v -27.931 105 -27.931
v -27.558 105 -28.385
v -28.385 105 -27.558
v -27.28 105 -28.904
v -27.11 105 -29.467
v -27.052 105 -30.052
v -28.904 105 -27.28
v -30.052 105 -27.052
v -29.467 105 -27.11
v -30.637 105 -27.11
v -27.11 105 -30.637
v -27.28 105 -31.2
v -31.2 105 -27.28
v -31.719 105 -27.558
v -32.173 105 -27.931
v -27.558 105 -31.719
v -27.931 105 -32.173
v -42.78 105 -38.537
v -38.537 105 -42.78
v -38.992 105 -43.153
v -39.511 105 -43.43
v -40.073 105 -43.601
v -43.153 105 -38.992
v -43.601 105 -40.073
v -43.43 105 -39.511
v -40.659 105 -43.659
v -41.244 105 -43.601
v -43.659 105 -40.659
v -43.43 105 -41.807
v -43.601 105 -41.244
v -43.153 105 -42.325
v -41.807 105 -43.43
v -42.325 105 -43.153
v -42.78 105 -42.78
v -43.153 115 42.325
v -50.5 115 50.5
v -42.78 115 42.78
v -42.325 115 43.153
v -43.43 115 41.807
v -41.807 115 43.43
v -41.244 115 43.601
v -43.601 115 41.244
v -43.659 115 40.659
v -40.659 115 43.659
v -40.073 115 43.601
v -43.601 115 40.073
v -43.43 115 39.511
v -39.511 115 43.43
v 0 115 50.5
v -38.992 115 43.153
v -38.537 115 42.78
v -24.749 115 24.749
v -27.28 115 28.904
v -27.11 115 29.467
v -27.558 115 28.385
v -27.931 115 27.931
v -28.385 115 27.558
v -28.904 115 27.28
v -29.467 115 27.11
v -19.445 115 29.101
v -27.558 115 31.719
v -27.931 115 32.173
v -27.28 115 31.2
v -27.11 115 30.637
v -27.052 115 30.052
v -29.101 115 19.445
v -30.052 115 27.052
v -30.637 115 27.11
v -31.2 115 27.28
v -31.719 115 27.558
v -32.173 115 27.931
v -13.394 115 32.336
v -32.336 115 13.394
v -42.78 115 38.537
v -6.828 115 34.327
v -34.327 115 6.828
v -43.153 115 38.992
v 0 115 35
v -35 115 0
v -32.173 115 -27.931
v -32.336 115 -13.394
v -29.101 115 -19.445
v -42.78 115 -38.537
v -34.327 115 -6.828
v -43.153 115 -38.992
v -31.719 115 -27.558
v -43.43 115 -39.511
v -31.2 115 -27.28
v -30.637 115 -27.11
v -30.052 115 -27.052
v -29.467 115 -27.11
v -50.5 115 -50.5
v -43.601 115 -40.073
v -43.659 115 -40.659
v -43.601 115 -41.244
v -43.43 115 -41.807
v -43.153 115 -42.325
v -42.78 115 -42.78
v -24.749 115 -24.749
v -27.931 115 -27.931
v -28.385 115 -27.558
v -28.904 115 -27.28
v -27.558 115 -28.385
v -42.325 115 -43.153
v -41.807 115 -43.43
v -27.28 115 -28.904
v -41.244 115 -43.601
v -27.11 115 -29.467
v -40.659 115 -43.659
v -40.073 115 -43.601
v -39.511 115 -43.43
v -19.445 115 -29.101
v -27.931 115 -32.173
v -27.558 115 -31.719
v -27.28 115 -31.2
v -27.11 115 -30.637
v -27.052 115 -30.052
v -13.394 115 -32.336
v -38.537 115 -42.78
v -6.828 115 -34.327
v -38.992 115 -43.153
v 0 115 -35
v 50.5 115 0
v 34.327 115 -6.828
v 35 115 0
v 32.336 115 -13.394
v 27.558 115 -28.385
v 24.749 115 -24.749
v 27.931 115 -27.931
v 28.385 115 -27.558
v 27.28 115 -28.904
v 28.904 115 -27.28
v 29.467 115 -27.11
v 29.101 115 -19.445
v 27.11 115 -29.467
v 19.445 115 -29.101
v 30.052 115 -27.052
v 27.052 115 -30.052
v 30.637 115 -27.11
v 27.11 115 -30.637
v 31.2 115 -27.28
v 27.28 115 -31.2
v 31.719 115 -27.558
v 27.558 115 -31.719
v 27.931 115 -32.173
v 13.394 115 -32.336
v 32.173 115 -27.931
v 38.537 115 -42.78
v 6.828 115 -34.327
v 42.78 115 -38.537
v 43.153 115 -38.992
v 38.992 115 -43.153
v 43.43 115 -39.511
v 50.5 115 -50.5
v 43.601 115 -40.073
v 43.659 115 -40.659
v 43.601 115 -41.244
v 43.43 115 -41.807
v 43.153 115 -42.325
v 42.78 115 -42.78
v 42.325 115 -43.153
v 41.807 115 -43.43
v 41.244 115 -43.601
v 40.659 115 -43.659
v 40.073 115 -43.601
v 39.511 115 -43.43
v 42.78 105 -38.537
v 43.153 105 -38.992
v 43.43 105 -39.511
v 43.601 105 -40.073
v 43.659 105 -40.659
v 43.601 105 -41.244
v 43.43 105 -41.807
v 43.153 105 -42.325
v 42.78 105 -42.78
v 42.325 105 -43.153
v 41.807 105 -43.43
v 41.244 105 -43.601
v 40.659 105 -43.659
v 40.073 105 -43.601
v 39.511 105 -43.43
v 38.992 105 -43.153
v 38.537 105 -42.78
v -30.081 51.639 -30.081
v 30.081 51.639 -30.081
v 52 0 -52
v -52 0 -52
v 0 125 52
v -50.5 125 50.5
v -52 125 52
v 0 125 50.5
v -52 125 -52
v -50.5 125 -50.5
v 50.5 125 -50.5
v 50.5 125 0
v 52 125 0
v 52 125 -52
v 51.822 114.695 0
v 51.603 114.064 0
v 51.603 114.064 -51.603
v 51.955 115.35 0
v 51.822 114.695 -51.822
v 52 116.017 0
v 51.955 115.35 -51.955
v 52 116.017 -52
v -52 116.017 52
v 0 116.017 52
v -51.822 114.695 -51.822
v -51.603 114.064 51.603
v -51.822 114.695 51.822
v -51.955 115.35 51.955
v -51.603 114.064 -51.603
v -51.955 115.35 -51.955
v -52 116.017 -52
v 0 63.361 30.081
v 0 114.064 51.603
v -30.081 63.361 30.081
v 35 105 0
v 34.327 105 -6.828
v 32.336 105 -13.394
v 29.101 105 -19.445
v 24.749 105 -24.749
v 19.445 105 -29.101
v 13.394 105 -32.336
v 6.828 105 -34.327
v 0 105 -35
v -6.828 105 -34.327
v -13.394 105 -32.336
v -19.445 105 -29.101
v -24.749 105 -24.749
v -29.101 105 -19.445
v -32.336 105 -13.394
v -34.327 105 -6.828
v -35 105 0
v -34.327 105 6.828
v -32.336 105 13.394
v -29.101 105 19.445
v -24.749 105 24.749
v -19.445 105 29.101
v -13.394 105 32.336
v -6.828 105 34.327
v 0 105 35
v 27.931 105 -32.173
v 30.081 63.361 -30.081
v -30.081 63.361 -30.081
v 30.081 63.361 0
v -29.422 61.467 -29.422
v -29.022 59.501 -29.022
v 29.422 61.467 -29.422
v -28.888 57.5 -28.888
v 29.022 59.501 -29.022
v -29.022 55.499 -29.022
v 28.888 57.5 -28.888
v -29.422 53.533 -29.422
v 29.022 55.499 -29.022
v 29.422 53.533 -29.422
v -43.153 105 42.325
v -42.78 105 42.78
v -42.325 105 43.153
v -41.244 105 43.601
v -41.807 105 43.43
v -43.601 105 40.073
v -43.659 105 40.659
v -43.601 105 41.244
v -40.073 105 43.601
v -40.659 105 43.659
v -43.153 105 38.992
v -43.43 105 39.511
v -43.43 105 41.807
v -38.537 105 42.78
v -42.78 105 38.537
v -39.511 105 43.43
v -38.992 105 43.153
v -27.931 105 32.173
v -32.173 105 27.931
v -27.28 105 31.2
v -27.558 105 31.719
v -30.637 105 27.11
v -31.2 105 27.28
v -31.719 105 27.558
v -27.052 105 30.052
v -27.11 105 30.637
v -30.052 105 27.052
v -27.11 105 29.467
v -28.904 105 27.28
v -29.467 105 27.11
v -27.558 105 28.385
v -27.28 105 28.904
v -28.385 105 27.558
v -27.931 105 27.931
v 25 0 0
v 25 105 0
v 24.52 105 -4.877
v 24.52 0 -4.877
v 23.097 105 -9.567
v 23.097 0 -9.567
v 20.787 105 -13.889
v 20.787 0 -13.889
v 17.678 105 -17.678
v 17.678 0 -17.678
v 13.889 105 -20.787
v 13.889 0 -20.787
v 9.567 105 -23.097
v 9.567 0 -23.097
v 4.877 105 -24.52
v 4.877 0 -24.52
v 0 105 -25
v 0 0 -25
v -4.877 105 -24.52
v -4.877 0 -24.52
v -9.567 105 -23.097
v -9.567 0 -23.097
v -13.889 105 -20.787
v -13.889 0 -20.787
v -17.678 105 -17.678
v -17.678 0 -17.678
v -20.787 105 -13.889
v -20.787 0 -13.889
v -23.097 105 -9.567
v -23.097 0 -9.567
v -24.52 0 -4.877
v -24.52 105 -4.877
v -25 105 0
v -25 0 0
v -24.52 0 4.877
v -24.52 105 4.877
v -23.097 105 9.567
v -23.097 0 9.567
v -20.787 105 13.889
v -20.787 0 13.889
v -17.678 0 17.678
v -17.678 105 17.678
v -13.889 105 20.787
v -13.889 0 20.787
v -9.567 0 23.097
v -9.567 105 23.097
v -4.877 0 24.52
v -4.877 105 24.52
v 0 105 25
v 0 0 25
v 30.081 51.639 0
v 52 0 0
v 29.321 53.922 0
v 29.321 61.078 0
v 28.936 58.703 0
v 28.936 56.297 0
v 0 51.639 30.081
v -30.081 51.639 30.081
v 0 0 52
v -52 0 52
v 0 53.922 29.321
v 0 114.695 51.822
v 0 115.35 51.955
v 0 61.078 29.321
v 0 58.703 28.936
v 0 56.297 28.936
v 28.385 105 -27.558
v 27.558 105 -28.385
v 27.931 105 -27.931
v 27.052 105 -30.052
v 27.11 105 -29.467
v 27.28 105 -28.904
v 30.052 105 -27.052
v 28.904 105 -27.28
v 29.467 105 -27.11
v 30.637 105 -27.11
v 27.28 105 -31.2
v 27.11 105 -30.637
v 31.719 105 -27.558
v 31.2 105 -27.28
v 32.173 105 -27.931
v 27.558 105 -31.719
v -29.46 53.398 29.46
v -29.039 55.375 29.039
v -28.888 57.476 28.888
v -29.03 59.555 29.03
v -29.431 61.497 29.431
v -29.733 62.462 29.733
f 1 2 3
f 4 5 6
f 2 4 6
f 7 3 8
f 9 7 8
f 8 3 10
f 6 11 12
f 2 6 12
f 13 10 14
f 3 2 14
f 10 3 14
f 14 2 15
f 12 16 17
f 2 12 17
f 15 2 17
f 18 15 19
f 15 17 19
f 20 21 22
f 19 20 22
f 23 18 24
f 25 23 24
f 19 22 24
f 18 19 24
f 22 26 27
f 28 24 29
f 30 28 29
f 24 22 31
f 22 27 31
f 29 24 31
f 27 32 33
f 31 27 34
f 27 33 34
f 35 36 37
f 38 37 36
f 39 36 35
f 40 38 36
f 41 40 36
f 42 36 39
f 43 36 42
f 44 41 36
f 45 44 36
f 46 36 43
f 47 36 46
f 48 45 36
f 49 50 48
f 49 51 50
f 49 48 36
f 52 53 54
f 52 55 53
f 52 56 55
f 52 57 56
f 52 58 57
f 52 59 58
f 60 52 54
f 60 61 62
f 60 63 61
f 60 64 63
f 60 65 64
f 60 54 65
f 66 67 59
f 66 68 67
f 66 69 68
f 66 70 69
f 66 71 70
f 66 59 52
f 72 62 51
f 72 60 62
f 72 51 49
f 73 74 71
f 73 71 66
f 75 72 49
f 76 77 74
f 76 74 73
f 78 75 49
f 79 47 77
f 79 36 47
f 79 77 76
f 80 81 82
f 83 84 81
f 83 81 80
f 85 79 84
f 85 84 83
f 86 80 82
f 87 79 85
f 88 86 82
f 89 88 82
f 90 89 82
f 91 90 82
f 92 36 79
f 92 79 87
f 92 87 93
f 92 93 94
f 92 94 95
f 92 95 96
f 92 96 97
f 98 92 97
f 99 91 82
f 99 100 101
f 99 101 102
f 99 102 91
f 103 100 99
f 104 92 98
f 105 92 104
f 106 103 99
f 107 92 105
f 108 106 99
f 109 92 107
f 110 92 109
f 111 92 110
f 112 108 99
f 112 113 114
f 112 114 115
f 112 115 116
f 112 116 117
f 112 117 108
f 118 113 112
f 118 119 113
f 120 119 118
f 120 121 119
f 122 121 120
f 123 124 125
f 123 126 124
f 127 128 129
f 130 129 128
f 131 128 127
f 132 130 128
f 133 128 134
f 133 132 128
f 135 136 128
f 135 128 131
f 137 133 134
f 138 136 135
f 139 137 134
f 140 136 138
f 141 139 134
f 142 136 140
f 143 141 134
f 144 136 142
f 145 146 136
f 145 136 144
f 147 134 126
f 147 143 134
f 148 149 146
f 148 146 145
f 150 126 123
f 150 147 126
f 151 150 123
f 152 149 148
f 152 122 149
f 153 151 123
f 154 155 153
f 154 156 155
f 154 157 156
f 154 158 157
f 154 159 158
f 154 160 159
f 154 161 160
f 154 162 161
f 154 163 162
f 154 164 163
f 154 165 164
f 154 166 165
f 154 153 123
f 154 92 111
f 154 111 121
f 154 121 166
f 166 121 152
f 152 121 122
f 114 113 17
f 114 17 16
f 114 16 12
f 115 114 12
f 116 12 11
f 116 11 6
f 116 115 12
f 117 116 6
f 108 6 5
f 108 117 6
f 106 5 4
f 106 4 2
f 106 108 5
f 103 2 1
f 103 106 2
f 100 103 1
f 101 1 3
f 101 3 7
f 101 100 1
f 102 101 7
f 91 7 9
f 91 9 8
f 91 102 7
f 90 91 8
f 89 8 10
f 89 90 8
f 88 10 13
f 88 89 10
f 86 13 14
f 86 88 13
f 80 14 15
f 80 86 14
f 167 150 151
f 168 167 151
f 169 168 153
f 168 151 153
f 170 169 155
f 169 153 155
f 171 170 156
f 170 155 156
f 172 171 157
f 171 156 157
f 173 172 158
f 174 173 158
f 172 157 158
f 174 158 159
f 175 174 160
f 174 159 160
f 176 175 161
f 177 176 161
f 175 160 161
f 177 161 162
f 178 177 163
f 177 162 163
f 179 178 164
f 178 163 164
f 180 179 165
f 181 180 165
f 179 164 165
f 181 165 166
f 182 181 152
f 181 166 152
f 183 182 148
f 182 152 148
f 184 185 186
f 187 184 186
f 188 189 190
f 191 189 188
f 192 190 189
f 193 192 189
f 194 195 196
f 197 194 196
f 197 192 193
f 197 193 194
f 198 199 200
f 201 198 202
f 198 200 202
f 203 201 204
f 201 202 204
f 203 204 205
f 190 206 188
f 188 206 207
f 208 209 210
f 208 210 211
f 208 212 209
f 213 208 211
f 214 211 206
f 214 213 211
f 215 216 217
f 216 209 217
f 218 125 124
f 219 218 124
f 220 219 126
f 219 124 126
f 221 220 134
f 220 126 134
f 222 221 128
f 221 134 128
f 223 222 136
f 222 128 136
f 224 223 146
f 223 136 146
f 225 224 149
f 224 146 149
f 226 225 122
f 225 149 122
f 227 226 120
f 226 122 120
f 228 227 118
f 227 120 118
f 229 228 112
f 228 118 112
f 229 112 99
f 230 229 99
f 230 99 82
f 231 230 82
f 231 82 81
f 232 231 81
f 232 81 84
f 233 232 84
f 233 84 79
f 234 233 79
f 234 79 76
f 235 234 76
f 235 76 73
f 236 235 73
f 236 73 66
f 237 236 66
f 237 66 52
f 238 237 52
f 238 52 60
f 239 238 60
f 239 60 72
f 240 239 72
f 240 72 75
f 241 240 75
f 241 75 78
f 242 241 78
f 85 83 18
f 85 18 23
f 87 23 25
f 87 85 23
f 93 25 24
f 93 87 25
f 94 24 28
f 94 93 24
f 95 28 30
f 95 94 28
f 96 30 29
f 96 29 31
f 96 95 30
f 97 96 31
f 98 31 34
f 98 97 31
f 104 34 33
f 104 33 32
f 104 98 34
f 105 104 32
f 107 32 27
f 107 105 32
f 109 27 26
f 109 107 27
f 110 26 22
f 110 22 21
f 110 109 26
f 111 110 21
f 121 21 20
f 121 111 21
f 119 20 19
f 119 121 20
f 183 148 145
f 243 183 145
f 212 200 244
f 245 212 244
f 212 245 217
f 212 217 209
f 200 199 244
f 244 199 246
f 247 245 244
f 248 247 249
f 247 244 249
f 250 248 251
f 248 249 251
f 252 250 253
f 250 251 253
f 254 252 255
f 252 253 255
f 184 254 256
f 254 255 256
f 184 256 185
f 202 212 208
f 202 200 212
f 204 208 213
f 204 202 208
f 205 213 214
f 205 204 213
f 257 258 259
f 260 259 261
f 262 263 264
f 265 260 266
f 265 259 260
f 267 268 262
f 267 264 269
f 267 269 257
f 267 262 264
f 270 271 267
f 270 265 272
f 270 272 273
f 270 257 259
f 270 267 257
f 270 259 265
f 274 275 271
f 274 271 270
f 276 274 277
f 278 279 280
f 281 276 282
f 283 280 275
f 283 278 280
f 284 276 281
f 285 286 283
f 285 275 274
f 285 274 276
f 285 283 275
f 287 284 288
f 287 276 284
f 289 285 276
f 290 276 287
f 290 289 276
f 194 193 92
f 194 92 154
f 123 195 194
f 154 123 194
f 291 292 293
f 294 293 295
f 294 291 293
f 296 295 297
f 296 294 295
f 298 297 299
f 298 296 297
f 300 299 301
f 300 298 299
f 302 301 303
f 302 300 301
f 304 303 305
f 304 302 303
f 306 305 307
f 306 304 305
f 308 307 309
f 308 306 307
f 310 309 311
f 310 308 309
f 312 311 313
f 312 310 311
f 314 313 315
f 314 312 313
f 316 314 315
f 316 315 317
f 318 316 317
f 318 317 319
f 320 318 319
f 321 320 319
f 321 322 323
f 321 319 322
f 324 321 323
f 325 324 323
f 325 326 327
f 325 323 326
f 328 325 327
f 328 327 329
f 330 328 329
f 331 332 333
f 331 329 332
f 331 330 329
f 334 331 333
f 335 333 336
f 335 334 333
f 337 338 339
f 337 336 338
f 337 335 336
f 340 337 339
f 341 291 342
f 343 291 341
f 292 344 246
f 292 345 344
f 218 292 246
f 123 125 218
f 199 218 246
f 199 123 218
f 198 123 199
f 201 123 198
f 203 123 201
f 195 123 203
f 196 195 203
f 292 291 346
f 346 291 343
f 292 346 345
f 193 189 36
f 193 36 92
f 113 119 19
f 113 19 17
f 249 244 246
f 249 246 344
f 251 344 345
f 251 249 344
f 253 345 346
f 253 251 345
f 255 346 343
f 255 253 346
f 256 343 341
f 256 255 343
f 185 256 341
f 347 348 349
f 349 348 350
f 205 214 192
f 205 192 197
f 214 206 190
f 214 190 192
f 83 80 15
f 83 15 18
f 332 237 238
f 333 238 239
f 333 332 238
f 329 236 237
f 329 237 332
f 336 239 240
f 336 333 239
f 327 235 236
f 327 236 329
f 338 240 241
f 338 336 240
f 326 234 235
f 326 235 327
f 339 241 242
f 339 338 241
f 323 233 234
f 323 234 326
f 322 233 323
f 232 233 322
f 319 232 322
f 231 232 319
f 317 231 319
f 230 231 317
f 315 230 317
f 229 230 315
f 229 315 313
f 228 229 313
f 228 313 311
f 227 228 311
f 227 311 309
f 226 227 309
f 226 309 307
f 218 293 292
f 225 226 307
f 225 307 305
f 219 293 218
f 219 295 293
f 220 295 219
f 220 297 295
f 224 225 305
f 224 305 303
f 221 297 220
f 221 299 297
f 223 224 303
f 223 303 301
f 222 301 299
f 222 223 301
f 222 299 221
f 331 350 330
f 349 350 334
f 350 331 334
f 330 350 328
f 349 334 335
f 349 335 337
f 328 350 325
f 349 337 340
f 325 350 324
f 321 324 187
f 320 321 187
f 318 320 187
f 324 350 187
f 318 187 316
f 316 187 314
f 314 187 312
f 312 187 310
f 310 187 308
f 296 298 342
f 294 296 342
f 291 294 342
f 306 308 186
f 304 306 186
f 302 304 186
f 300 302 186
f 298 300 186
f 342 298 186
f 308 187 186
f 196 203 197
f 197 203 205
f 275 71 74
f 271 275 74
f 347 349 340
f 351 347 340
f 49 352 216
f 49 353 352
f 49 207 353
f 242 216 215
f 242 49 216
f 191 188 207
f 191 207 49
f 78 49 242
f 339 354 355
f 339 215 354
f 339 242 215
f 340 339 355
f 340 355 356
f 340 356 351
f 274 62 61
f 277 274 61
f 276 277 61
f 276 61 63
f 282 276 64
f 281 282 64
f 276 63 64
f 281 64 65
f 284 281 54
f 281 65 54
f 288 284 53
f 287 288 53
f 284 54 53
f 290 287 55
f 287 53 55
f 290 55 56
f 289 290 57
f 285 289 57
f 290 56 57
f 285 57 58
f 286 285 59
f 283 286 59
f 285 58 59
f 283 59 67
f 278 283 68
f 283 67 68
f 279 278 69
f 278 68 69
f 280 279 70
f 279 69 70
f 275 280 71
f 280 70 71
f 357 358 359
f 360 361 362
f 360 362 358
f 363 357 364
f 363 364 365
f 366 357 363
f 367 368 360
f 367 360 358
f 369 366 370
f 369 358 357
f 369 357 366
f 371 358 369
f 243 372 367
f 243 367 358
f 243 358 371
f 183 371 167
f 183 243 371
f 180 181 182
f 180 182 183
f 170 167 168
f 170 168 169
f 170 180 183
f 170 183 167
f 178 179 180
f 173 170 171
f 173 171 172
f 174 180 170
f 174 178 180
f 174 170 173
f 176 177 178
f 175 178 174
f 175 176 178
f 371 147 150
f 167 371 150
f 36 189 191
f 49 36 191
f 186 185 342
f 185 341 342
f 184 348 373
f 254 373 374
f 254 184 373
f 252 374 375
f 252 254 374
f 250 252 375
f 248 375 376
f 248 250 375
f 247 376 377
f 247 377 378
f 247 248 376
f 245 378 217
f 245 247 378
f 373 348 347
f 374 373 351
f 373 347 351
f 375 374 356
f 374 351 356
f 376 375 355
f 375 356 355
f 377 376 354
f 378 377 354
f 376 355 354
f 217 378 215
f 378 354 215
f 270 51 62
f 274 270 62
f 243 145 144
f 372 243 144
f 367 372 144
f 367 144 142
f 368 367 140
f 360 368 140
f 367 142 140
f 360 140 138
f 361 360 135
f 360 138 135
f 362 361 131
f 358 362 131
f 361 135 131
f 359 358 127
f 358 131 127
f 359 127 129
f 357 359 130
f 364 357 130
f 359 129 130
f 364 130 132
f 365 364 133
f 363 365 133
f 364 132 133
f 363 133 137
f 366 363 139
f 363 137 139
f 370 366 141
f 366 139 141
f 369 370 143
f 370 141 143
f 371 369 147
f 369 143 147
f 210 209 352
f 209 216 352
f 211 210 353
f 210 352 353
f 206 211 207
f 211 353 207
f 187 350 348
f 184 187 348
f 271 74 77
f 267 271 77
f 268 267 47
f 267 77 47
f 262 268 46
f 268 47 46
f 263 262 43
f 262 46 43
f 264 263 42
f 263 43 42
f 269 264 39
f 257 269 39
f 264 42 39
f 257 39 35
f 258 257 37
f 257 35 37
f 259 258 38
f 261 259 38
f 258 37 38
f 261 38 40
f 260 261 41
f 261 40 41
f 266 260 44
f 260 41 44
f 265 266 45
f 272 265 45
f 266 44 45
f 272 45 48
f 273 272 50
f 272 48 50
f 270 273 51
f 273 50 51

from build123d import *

# Parameters (mm, degrees)
SKETCH1_W               = 104
SKETCH1_H               = 104
BOSS_EXTRUDE1_DEPTH     = 125
CUT_EXTRUDE3_DEPTH      = 125
CUT_EXTRUDE4_DEPTH      = 146.027583583
CUT_EXTRUDE4_DEPTH_BACK = 146.027583583
CUT_EXTRUDE5_DEPTH      = 146.027583583
CUT_EXTRUDE5_DEPTH_BACK = 146.027583583
SKETCH4_R               = 25
SKETCH5_W               = 101
SKETCH5_H               = 101
CUT_EXTRUDE6_DEPTH      = 10
SKETCH6_W               = 52
SKETCH6_H               = 52
CUT_EXTRUDE7_DEPTH      = 125
SKETCH7_W               = 52
SKETCH7_H               = 52
CUT_EXTRUDE8_DEPTH      = 125
SKETCH8_R               = 35
CUT_EXTRUDE9_DEPTH      = 10
CUT_EXTRUDE10_DEPTH     = 10
FILLET3_R               = 5
FILLET4_R               = 15


with BuildPart() as part:
    # Sketch1 → Boss-Extrude1 (new body)
    with BuildSketch(Plane(origin=(0, 0, 0), x_dir=(1, 0, 0), z_dir=(0, 1, 0))):
        Rectangle(SKETCH1_W, SKETCH1_H)
    extrude(amount=BOSS_EXTRUDE1_DEPTH)

    # Sketch2 → Cut-Extrude3 (cut)
    with BuildSketch(Plane.XY.offset(52)):
        Polygon((-27.592698068, 57.5), (-52, 115), (-52, 0), align=None)
        Polygon((52, 0), (52, 115), (27.592698068, 57.5), align=None)
    extrude(amount=-CUT_EXTRUDE3_DEPTH, mode=Mode.SUBTRACT)

    # Sketch3 → Cut-Extrude4 (cut, two sides: drawn at the far end of the back side and taken through both)
    with BuildSketch(Plane(origin=(0, 0, 0), x_dir=(0, 0, -1), z_dir=(1, 0, 0)).offset(-CUT_EXTRUDE4_DEPTH_BACK)):
        Polygon((-52, 115), (-27.592698068, 57.5), (-52, 0), align=None)
        Polygon((52, 115), (27.592698068, 57.5), (52, 0), align=None)
    extrude(amount=CUT_EXTRUDE4_DEPTH + CUT_EXTRUDE4_DEPTH_BACK, mode=Mode.SUBTRACT)

    # Sketch4 → Cut-Extrude5 (cut, two sides: drawn at the far end of the back side and taken through both)
    with BuildSketch(Plane(origin=(0, 125, 0), x_dir=(1, 0, 0), z_dir=(0, 1, 0)).offset(-CUT_EXTRUDE5_DEPTH_BACK)):
        with Locations(Location((0, 0, 0), (0, 0, 270))):
            Circle(SKETCH4_R)
    extrude(amount=CUT_EXTRUDE5_DEPTH + CUT_EXTRUDE5_DEPTH_BACK, mode=Mode.SUBTRACT)

    # Sketch5 → Cut-Extrude6 (cut)
    with BuildSketch(Plane(origin=(0, 125, 0), x_dir=(1, 0, 0), z_dir=(0, 1, 0))):
        Rectangle(SKETCH5_W, SKETCH5_H)
    extrude(amount=-CUT_EXTRUDE6_DEPTH, mode=Mode.SUBTRACT)

    # Sketch6 → Cut-Extrude7 (cut)
    with BuildSketch(Plane(origin=(0, 115, 0), x_dir=(1, 0, 0), z_dir=(0, 1, 0))):
        with Locations((26, -26)):
            Rectangle(SKETCH6_W, SKETCH6_H)
    extrude(amount=-CUT_EXTRUDE7_DEPTH, mode=Mode.SUBTRACT)

    # Sketch7 → Cut-Extrude8 (cut)
    with BuildSketch(Plane(origin=(0, 125, 0), x_dir=(1, 0, 0), z_dir=(0, 1, 0))):
        with Locations((26, -26)):
            Rectangle(SKETCH7_W, SKETCH7_H)
    extrude(amount=-CUT_EXTRUDE8_DEPTH, mode=Mode.SUBTRACT)

    # Sketch8 → Cut-Extrude9 (cut)
    with BuildSketch(Plane(origin=(0, 115, 0), x_dir=(1, 0, 0), z_dir=(0, 1, 0))):
        Circle(SKETCH8_R)
    extrude(amount=-CUT_EXTRUDE9_DEPTH, mode=Mode.SUBTRACT)

    # Sketch9 → Cut-Extrude10 (cut)
    with BuildSketch(Plane(origin=(0, 115, 0), x_dir=(1, 0, 0), z_dir=(0, 1, 0))):
        with BuildLine():
            Line((-38.537319575, 42.779960262), (-27.930717857, 32.173358544))
            ThreePointArc((-27.930717857, 32.173358544), (-27.930717857, 27.930717857), (-32.173358544, 27.930717857))
            Line((-32.173358544, 27.930717857), (-42.779960262, 38.537319575))
            ThreePointArc((-42.779960262, 38.537319575), (-42.779960262, 42.779960262), (-38.537319575, 42.779960262))
        make_face()
        with BuildLine():
            Line((38.537319575, 42.779960262), (27.930717857, 32.173358544))
            ThreePointArc((27.930717857, 32.173358544), (27.930717857, 27.930717857), (32.173358544, 27.930717857))
            Line((32.173358544, 27.930717857), (42.779960262, 38.537319575))
            ThreePointArc((42.779960262, 38.537319575), (42.779960262, 42.779960262), (38.537319575, 42.779960262))
        make_face()
        with BuildLine():
            Line((-38.537319575, -42.779960262), (-27.930717857, -32.173358544))
            ThreePointArc((-27.930717857, -32.173358544), (-27.930717857, -27.930717857), (-32.173358544, -27.930717857))
            Line((-32.173358544, -27.930717857), (-42.779960262, -38.537319575))
            ThreePointArc((-42.779960262, -38.537319575), (-42.779960262, -42.779960262), (-38.537319575, -42.779960262))
        make_face()
    extrude(amount=-CUT_EXTRUDE10_DEPTH, mode=Mode.SUBTRACT)

    # Fillet3
    fillet3_edges = [part.edges().sort_by_distance(p)[0] for p in [
        (-52, 115, 0),
        (52, 115, -26),
        (-26, 115, 52),
        (0, 115, -52),
    ]]
    fillet(fillet3_edges, radius=FILLET3_R)

    # Fillet4
    fillet4_edges = [part.edges().sort_by_distance(p)[0] for p in [
        (-27.592698068, 57.5, 0),
        (27.592698068, 57.5, -13.796349034),
        (-13.796349034, 57.5, 27.592698068),
        (0, 57.5, -27.592698068),
    ]]
    fillet(fillet4_edges, radius=FILLET4_R)


solid = part.part
